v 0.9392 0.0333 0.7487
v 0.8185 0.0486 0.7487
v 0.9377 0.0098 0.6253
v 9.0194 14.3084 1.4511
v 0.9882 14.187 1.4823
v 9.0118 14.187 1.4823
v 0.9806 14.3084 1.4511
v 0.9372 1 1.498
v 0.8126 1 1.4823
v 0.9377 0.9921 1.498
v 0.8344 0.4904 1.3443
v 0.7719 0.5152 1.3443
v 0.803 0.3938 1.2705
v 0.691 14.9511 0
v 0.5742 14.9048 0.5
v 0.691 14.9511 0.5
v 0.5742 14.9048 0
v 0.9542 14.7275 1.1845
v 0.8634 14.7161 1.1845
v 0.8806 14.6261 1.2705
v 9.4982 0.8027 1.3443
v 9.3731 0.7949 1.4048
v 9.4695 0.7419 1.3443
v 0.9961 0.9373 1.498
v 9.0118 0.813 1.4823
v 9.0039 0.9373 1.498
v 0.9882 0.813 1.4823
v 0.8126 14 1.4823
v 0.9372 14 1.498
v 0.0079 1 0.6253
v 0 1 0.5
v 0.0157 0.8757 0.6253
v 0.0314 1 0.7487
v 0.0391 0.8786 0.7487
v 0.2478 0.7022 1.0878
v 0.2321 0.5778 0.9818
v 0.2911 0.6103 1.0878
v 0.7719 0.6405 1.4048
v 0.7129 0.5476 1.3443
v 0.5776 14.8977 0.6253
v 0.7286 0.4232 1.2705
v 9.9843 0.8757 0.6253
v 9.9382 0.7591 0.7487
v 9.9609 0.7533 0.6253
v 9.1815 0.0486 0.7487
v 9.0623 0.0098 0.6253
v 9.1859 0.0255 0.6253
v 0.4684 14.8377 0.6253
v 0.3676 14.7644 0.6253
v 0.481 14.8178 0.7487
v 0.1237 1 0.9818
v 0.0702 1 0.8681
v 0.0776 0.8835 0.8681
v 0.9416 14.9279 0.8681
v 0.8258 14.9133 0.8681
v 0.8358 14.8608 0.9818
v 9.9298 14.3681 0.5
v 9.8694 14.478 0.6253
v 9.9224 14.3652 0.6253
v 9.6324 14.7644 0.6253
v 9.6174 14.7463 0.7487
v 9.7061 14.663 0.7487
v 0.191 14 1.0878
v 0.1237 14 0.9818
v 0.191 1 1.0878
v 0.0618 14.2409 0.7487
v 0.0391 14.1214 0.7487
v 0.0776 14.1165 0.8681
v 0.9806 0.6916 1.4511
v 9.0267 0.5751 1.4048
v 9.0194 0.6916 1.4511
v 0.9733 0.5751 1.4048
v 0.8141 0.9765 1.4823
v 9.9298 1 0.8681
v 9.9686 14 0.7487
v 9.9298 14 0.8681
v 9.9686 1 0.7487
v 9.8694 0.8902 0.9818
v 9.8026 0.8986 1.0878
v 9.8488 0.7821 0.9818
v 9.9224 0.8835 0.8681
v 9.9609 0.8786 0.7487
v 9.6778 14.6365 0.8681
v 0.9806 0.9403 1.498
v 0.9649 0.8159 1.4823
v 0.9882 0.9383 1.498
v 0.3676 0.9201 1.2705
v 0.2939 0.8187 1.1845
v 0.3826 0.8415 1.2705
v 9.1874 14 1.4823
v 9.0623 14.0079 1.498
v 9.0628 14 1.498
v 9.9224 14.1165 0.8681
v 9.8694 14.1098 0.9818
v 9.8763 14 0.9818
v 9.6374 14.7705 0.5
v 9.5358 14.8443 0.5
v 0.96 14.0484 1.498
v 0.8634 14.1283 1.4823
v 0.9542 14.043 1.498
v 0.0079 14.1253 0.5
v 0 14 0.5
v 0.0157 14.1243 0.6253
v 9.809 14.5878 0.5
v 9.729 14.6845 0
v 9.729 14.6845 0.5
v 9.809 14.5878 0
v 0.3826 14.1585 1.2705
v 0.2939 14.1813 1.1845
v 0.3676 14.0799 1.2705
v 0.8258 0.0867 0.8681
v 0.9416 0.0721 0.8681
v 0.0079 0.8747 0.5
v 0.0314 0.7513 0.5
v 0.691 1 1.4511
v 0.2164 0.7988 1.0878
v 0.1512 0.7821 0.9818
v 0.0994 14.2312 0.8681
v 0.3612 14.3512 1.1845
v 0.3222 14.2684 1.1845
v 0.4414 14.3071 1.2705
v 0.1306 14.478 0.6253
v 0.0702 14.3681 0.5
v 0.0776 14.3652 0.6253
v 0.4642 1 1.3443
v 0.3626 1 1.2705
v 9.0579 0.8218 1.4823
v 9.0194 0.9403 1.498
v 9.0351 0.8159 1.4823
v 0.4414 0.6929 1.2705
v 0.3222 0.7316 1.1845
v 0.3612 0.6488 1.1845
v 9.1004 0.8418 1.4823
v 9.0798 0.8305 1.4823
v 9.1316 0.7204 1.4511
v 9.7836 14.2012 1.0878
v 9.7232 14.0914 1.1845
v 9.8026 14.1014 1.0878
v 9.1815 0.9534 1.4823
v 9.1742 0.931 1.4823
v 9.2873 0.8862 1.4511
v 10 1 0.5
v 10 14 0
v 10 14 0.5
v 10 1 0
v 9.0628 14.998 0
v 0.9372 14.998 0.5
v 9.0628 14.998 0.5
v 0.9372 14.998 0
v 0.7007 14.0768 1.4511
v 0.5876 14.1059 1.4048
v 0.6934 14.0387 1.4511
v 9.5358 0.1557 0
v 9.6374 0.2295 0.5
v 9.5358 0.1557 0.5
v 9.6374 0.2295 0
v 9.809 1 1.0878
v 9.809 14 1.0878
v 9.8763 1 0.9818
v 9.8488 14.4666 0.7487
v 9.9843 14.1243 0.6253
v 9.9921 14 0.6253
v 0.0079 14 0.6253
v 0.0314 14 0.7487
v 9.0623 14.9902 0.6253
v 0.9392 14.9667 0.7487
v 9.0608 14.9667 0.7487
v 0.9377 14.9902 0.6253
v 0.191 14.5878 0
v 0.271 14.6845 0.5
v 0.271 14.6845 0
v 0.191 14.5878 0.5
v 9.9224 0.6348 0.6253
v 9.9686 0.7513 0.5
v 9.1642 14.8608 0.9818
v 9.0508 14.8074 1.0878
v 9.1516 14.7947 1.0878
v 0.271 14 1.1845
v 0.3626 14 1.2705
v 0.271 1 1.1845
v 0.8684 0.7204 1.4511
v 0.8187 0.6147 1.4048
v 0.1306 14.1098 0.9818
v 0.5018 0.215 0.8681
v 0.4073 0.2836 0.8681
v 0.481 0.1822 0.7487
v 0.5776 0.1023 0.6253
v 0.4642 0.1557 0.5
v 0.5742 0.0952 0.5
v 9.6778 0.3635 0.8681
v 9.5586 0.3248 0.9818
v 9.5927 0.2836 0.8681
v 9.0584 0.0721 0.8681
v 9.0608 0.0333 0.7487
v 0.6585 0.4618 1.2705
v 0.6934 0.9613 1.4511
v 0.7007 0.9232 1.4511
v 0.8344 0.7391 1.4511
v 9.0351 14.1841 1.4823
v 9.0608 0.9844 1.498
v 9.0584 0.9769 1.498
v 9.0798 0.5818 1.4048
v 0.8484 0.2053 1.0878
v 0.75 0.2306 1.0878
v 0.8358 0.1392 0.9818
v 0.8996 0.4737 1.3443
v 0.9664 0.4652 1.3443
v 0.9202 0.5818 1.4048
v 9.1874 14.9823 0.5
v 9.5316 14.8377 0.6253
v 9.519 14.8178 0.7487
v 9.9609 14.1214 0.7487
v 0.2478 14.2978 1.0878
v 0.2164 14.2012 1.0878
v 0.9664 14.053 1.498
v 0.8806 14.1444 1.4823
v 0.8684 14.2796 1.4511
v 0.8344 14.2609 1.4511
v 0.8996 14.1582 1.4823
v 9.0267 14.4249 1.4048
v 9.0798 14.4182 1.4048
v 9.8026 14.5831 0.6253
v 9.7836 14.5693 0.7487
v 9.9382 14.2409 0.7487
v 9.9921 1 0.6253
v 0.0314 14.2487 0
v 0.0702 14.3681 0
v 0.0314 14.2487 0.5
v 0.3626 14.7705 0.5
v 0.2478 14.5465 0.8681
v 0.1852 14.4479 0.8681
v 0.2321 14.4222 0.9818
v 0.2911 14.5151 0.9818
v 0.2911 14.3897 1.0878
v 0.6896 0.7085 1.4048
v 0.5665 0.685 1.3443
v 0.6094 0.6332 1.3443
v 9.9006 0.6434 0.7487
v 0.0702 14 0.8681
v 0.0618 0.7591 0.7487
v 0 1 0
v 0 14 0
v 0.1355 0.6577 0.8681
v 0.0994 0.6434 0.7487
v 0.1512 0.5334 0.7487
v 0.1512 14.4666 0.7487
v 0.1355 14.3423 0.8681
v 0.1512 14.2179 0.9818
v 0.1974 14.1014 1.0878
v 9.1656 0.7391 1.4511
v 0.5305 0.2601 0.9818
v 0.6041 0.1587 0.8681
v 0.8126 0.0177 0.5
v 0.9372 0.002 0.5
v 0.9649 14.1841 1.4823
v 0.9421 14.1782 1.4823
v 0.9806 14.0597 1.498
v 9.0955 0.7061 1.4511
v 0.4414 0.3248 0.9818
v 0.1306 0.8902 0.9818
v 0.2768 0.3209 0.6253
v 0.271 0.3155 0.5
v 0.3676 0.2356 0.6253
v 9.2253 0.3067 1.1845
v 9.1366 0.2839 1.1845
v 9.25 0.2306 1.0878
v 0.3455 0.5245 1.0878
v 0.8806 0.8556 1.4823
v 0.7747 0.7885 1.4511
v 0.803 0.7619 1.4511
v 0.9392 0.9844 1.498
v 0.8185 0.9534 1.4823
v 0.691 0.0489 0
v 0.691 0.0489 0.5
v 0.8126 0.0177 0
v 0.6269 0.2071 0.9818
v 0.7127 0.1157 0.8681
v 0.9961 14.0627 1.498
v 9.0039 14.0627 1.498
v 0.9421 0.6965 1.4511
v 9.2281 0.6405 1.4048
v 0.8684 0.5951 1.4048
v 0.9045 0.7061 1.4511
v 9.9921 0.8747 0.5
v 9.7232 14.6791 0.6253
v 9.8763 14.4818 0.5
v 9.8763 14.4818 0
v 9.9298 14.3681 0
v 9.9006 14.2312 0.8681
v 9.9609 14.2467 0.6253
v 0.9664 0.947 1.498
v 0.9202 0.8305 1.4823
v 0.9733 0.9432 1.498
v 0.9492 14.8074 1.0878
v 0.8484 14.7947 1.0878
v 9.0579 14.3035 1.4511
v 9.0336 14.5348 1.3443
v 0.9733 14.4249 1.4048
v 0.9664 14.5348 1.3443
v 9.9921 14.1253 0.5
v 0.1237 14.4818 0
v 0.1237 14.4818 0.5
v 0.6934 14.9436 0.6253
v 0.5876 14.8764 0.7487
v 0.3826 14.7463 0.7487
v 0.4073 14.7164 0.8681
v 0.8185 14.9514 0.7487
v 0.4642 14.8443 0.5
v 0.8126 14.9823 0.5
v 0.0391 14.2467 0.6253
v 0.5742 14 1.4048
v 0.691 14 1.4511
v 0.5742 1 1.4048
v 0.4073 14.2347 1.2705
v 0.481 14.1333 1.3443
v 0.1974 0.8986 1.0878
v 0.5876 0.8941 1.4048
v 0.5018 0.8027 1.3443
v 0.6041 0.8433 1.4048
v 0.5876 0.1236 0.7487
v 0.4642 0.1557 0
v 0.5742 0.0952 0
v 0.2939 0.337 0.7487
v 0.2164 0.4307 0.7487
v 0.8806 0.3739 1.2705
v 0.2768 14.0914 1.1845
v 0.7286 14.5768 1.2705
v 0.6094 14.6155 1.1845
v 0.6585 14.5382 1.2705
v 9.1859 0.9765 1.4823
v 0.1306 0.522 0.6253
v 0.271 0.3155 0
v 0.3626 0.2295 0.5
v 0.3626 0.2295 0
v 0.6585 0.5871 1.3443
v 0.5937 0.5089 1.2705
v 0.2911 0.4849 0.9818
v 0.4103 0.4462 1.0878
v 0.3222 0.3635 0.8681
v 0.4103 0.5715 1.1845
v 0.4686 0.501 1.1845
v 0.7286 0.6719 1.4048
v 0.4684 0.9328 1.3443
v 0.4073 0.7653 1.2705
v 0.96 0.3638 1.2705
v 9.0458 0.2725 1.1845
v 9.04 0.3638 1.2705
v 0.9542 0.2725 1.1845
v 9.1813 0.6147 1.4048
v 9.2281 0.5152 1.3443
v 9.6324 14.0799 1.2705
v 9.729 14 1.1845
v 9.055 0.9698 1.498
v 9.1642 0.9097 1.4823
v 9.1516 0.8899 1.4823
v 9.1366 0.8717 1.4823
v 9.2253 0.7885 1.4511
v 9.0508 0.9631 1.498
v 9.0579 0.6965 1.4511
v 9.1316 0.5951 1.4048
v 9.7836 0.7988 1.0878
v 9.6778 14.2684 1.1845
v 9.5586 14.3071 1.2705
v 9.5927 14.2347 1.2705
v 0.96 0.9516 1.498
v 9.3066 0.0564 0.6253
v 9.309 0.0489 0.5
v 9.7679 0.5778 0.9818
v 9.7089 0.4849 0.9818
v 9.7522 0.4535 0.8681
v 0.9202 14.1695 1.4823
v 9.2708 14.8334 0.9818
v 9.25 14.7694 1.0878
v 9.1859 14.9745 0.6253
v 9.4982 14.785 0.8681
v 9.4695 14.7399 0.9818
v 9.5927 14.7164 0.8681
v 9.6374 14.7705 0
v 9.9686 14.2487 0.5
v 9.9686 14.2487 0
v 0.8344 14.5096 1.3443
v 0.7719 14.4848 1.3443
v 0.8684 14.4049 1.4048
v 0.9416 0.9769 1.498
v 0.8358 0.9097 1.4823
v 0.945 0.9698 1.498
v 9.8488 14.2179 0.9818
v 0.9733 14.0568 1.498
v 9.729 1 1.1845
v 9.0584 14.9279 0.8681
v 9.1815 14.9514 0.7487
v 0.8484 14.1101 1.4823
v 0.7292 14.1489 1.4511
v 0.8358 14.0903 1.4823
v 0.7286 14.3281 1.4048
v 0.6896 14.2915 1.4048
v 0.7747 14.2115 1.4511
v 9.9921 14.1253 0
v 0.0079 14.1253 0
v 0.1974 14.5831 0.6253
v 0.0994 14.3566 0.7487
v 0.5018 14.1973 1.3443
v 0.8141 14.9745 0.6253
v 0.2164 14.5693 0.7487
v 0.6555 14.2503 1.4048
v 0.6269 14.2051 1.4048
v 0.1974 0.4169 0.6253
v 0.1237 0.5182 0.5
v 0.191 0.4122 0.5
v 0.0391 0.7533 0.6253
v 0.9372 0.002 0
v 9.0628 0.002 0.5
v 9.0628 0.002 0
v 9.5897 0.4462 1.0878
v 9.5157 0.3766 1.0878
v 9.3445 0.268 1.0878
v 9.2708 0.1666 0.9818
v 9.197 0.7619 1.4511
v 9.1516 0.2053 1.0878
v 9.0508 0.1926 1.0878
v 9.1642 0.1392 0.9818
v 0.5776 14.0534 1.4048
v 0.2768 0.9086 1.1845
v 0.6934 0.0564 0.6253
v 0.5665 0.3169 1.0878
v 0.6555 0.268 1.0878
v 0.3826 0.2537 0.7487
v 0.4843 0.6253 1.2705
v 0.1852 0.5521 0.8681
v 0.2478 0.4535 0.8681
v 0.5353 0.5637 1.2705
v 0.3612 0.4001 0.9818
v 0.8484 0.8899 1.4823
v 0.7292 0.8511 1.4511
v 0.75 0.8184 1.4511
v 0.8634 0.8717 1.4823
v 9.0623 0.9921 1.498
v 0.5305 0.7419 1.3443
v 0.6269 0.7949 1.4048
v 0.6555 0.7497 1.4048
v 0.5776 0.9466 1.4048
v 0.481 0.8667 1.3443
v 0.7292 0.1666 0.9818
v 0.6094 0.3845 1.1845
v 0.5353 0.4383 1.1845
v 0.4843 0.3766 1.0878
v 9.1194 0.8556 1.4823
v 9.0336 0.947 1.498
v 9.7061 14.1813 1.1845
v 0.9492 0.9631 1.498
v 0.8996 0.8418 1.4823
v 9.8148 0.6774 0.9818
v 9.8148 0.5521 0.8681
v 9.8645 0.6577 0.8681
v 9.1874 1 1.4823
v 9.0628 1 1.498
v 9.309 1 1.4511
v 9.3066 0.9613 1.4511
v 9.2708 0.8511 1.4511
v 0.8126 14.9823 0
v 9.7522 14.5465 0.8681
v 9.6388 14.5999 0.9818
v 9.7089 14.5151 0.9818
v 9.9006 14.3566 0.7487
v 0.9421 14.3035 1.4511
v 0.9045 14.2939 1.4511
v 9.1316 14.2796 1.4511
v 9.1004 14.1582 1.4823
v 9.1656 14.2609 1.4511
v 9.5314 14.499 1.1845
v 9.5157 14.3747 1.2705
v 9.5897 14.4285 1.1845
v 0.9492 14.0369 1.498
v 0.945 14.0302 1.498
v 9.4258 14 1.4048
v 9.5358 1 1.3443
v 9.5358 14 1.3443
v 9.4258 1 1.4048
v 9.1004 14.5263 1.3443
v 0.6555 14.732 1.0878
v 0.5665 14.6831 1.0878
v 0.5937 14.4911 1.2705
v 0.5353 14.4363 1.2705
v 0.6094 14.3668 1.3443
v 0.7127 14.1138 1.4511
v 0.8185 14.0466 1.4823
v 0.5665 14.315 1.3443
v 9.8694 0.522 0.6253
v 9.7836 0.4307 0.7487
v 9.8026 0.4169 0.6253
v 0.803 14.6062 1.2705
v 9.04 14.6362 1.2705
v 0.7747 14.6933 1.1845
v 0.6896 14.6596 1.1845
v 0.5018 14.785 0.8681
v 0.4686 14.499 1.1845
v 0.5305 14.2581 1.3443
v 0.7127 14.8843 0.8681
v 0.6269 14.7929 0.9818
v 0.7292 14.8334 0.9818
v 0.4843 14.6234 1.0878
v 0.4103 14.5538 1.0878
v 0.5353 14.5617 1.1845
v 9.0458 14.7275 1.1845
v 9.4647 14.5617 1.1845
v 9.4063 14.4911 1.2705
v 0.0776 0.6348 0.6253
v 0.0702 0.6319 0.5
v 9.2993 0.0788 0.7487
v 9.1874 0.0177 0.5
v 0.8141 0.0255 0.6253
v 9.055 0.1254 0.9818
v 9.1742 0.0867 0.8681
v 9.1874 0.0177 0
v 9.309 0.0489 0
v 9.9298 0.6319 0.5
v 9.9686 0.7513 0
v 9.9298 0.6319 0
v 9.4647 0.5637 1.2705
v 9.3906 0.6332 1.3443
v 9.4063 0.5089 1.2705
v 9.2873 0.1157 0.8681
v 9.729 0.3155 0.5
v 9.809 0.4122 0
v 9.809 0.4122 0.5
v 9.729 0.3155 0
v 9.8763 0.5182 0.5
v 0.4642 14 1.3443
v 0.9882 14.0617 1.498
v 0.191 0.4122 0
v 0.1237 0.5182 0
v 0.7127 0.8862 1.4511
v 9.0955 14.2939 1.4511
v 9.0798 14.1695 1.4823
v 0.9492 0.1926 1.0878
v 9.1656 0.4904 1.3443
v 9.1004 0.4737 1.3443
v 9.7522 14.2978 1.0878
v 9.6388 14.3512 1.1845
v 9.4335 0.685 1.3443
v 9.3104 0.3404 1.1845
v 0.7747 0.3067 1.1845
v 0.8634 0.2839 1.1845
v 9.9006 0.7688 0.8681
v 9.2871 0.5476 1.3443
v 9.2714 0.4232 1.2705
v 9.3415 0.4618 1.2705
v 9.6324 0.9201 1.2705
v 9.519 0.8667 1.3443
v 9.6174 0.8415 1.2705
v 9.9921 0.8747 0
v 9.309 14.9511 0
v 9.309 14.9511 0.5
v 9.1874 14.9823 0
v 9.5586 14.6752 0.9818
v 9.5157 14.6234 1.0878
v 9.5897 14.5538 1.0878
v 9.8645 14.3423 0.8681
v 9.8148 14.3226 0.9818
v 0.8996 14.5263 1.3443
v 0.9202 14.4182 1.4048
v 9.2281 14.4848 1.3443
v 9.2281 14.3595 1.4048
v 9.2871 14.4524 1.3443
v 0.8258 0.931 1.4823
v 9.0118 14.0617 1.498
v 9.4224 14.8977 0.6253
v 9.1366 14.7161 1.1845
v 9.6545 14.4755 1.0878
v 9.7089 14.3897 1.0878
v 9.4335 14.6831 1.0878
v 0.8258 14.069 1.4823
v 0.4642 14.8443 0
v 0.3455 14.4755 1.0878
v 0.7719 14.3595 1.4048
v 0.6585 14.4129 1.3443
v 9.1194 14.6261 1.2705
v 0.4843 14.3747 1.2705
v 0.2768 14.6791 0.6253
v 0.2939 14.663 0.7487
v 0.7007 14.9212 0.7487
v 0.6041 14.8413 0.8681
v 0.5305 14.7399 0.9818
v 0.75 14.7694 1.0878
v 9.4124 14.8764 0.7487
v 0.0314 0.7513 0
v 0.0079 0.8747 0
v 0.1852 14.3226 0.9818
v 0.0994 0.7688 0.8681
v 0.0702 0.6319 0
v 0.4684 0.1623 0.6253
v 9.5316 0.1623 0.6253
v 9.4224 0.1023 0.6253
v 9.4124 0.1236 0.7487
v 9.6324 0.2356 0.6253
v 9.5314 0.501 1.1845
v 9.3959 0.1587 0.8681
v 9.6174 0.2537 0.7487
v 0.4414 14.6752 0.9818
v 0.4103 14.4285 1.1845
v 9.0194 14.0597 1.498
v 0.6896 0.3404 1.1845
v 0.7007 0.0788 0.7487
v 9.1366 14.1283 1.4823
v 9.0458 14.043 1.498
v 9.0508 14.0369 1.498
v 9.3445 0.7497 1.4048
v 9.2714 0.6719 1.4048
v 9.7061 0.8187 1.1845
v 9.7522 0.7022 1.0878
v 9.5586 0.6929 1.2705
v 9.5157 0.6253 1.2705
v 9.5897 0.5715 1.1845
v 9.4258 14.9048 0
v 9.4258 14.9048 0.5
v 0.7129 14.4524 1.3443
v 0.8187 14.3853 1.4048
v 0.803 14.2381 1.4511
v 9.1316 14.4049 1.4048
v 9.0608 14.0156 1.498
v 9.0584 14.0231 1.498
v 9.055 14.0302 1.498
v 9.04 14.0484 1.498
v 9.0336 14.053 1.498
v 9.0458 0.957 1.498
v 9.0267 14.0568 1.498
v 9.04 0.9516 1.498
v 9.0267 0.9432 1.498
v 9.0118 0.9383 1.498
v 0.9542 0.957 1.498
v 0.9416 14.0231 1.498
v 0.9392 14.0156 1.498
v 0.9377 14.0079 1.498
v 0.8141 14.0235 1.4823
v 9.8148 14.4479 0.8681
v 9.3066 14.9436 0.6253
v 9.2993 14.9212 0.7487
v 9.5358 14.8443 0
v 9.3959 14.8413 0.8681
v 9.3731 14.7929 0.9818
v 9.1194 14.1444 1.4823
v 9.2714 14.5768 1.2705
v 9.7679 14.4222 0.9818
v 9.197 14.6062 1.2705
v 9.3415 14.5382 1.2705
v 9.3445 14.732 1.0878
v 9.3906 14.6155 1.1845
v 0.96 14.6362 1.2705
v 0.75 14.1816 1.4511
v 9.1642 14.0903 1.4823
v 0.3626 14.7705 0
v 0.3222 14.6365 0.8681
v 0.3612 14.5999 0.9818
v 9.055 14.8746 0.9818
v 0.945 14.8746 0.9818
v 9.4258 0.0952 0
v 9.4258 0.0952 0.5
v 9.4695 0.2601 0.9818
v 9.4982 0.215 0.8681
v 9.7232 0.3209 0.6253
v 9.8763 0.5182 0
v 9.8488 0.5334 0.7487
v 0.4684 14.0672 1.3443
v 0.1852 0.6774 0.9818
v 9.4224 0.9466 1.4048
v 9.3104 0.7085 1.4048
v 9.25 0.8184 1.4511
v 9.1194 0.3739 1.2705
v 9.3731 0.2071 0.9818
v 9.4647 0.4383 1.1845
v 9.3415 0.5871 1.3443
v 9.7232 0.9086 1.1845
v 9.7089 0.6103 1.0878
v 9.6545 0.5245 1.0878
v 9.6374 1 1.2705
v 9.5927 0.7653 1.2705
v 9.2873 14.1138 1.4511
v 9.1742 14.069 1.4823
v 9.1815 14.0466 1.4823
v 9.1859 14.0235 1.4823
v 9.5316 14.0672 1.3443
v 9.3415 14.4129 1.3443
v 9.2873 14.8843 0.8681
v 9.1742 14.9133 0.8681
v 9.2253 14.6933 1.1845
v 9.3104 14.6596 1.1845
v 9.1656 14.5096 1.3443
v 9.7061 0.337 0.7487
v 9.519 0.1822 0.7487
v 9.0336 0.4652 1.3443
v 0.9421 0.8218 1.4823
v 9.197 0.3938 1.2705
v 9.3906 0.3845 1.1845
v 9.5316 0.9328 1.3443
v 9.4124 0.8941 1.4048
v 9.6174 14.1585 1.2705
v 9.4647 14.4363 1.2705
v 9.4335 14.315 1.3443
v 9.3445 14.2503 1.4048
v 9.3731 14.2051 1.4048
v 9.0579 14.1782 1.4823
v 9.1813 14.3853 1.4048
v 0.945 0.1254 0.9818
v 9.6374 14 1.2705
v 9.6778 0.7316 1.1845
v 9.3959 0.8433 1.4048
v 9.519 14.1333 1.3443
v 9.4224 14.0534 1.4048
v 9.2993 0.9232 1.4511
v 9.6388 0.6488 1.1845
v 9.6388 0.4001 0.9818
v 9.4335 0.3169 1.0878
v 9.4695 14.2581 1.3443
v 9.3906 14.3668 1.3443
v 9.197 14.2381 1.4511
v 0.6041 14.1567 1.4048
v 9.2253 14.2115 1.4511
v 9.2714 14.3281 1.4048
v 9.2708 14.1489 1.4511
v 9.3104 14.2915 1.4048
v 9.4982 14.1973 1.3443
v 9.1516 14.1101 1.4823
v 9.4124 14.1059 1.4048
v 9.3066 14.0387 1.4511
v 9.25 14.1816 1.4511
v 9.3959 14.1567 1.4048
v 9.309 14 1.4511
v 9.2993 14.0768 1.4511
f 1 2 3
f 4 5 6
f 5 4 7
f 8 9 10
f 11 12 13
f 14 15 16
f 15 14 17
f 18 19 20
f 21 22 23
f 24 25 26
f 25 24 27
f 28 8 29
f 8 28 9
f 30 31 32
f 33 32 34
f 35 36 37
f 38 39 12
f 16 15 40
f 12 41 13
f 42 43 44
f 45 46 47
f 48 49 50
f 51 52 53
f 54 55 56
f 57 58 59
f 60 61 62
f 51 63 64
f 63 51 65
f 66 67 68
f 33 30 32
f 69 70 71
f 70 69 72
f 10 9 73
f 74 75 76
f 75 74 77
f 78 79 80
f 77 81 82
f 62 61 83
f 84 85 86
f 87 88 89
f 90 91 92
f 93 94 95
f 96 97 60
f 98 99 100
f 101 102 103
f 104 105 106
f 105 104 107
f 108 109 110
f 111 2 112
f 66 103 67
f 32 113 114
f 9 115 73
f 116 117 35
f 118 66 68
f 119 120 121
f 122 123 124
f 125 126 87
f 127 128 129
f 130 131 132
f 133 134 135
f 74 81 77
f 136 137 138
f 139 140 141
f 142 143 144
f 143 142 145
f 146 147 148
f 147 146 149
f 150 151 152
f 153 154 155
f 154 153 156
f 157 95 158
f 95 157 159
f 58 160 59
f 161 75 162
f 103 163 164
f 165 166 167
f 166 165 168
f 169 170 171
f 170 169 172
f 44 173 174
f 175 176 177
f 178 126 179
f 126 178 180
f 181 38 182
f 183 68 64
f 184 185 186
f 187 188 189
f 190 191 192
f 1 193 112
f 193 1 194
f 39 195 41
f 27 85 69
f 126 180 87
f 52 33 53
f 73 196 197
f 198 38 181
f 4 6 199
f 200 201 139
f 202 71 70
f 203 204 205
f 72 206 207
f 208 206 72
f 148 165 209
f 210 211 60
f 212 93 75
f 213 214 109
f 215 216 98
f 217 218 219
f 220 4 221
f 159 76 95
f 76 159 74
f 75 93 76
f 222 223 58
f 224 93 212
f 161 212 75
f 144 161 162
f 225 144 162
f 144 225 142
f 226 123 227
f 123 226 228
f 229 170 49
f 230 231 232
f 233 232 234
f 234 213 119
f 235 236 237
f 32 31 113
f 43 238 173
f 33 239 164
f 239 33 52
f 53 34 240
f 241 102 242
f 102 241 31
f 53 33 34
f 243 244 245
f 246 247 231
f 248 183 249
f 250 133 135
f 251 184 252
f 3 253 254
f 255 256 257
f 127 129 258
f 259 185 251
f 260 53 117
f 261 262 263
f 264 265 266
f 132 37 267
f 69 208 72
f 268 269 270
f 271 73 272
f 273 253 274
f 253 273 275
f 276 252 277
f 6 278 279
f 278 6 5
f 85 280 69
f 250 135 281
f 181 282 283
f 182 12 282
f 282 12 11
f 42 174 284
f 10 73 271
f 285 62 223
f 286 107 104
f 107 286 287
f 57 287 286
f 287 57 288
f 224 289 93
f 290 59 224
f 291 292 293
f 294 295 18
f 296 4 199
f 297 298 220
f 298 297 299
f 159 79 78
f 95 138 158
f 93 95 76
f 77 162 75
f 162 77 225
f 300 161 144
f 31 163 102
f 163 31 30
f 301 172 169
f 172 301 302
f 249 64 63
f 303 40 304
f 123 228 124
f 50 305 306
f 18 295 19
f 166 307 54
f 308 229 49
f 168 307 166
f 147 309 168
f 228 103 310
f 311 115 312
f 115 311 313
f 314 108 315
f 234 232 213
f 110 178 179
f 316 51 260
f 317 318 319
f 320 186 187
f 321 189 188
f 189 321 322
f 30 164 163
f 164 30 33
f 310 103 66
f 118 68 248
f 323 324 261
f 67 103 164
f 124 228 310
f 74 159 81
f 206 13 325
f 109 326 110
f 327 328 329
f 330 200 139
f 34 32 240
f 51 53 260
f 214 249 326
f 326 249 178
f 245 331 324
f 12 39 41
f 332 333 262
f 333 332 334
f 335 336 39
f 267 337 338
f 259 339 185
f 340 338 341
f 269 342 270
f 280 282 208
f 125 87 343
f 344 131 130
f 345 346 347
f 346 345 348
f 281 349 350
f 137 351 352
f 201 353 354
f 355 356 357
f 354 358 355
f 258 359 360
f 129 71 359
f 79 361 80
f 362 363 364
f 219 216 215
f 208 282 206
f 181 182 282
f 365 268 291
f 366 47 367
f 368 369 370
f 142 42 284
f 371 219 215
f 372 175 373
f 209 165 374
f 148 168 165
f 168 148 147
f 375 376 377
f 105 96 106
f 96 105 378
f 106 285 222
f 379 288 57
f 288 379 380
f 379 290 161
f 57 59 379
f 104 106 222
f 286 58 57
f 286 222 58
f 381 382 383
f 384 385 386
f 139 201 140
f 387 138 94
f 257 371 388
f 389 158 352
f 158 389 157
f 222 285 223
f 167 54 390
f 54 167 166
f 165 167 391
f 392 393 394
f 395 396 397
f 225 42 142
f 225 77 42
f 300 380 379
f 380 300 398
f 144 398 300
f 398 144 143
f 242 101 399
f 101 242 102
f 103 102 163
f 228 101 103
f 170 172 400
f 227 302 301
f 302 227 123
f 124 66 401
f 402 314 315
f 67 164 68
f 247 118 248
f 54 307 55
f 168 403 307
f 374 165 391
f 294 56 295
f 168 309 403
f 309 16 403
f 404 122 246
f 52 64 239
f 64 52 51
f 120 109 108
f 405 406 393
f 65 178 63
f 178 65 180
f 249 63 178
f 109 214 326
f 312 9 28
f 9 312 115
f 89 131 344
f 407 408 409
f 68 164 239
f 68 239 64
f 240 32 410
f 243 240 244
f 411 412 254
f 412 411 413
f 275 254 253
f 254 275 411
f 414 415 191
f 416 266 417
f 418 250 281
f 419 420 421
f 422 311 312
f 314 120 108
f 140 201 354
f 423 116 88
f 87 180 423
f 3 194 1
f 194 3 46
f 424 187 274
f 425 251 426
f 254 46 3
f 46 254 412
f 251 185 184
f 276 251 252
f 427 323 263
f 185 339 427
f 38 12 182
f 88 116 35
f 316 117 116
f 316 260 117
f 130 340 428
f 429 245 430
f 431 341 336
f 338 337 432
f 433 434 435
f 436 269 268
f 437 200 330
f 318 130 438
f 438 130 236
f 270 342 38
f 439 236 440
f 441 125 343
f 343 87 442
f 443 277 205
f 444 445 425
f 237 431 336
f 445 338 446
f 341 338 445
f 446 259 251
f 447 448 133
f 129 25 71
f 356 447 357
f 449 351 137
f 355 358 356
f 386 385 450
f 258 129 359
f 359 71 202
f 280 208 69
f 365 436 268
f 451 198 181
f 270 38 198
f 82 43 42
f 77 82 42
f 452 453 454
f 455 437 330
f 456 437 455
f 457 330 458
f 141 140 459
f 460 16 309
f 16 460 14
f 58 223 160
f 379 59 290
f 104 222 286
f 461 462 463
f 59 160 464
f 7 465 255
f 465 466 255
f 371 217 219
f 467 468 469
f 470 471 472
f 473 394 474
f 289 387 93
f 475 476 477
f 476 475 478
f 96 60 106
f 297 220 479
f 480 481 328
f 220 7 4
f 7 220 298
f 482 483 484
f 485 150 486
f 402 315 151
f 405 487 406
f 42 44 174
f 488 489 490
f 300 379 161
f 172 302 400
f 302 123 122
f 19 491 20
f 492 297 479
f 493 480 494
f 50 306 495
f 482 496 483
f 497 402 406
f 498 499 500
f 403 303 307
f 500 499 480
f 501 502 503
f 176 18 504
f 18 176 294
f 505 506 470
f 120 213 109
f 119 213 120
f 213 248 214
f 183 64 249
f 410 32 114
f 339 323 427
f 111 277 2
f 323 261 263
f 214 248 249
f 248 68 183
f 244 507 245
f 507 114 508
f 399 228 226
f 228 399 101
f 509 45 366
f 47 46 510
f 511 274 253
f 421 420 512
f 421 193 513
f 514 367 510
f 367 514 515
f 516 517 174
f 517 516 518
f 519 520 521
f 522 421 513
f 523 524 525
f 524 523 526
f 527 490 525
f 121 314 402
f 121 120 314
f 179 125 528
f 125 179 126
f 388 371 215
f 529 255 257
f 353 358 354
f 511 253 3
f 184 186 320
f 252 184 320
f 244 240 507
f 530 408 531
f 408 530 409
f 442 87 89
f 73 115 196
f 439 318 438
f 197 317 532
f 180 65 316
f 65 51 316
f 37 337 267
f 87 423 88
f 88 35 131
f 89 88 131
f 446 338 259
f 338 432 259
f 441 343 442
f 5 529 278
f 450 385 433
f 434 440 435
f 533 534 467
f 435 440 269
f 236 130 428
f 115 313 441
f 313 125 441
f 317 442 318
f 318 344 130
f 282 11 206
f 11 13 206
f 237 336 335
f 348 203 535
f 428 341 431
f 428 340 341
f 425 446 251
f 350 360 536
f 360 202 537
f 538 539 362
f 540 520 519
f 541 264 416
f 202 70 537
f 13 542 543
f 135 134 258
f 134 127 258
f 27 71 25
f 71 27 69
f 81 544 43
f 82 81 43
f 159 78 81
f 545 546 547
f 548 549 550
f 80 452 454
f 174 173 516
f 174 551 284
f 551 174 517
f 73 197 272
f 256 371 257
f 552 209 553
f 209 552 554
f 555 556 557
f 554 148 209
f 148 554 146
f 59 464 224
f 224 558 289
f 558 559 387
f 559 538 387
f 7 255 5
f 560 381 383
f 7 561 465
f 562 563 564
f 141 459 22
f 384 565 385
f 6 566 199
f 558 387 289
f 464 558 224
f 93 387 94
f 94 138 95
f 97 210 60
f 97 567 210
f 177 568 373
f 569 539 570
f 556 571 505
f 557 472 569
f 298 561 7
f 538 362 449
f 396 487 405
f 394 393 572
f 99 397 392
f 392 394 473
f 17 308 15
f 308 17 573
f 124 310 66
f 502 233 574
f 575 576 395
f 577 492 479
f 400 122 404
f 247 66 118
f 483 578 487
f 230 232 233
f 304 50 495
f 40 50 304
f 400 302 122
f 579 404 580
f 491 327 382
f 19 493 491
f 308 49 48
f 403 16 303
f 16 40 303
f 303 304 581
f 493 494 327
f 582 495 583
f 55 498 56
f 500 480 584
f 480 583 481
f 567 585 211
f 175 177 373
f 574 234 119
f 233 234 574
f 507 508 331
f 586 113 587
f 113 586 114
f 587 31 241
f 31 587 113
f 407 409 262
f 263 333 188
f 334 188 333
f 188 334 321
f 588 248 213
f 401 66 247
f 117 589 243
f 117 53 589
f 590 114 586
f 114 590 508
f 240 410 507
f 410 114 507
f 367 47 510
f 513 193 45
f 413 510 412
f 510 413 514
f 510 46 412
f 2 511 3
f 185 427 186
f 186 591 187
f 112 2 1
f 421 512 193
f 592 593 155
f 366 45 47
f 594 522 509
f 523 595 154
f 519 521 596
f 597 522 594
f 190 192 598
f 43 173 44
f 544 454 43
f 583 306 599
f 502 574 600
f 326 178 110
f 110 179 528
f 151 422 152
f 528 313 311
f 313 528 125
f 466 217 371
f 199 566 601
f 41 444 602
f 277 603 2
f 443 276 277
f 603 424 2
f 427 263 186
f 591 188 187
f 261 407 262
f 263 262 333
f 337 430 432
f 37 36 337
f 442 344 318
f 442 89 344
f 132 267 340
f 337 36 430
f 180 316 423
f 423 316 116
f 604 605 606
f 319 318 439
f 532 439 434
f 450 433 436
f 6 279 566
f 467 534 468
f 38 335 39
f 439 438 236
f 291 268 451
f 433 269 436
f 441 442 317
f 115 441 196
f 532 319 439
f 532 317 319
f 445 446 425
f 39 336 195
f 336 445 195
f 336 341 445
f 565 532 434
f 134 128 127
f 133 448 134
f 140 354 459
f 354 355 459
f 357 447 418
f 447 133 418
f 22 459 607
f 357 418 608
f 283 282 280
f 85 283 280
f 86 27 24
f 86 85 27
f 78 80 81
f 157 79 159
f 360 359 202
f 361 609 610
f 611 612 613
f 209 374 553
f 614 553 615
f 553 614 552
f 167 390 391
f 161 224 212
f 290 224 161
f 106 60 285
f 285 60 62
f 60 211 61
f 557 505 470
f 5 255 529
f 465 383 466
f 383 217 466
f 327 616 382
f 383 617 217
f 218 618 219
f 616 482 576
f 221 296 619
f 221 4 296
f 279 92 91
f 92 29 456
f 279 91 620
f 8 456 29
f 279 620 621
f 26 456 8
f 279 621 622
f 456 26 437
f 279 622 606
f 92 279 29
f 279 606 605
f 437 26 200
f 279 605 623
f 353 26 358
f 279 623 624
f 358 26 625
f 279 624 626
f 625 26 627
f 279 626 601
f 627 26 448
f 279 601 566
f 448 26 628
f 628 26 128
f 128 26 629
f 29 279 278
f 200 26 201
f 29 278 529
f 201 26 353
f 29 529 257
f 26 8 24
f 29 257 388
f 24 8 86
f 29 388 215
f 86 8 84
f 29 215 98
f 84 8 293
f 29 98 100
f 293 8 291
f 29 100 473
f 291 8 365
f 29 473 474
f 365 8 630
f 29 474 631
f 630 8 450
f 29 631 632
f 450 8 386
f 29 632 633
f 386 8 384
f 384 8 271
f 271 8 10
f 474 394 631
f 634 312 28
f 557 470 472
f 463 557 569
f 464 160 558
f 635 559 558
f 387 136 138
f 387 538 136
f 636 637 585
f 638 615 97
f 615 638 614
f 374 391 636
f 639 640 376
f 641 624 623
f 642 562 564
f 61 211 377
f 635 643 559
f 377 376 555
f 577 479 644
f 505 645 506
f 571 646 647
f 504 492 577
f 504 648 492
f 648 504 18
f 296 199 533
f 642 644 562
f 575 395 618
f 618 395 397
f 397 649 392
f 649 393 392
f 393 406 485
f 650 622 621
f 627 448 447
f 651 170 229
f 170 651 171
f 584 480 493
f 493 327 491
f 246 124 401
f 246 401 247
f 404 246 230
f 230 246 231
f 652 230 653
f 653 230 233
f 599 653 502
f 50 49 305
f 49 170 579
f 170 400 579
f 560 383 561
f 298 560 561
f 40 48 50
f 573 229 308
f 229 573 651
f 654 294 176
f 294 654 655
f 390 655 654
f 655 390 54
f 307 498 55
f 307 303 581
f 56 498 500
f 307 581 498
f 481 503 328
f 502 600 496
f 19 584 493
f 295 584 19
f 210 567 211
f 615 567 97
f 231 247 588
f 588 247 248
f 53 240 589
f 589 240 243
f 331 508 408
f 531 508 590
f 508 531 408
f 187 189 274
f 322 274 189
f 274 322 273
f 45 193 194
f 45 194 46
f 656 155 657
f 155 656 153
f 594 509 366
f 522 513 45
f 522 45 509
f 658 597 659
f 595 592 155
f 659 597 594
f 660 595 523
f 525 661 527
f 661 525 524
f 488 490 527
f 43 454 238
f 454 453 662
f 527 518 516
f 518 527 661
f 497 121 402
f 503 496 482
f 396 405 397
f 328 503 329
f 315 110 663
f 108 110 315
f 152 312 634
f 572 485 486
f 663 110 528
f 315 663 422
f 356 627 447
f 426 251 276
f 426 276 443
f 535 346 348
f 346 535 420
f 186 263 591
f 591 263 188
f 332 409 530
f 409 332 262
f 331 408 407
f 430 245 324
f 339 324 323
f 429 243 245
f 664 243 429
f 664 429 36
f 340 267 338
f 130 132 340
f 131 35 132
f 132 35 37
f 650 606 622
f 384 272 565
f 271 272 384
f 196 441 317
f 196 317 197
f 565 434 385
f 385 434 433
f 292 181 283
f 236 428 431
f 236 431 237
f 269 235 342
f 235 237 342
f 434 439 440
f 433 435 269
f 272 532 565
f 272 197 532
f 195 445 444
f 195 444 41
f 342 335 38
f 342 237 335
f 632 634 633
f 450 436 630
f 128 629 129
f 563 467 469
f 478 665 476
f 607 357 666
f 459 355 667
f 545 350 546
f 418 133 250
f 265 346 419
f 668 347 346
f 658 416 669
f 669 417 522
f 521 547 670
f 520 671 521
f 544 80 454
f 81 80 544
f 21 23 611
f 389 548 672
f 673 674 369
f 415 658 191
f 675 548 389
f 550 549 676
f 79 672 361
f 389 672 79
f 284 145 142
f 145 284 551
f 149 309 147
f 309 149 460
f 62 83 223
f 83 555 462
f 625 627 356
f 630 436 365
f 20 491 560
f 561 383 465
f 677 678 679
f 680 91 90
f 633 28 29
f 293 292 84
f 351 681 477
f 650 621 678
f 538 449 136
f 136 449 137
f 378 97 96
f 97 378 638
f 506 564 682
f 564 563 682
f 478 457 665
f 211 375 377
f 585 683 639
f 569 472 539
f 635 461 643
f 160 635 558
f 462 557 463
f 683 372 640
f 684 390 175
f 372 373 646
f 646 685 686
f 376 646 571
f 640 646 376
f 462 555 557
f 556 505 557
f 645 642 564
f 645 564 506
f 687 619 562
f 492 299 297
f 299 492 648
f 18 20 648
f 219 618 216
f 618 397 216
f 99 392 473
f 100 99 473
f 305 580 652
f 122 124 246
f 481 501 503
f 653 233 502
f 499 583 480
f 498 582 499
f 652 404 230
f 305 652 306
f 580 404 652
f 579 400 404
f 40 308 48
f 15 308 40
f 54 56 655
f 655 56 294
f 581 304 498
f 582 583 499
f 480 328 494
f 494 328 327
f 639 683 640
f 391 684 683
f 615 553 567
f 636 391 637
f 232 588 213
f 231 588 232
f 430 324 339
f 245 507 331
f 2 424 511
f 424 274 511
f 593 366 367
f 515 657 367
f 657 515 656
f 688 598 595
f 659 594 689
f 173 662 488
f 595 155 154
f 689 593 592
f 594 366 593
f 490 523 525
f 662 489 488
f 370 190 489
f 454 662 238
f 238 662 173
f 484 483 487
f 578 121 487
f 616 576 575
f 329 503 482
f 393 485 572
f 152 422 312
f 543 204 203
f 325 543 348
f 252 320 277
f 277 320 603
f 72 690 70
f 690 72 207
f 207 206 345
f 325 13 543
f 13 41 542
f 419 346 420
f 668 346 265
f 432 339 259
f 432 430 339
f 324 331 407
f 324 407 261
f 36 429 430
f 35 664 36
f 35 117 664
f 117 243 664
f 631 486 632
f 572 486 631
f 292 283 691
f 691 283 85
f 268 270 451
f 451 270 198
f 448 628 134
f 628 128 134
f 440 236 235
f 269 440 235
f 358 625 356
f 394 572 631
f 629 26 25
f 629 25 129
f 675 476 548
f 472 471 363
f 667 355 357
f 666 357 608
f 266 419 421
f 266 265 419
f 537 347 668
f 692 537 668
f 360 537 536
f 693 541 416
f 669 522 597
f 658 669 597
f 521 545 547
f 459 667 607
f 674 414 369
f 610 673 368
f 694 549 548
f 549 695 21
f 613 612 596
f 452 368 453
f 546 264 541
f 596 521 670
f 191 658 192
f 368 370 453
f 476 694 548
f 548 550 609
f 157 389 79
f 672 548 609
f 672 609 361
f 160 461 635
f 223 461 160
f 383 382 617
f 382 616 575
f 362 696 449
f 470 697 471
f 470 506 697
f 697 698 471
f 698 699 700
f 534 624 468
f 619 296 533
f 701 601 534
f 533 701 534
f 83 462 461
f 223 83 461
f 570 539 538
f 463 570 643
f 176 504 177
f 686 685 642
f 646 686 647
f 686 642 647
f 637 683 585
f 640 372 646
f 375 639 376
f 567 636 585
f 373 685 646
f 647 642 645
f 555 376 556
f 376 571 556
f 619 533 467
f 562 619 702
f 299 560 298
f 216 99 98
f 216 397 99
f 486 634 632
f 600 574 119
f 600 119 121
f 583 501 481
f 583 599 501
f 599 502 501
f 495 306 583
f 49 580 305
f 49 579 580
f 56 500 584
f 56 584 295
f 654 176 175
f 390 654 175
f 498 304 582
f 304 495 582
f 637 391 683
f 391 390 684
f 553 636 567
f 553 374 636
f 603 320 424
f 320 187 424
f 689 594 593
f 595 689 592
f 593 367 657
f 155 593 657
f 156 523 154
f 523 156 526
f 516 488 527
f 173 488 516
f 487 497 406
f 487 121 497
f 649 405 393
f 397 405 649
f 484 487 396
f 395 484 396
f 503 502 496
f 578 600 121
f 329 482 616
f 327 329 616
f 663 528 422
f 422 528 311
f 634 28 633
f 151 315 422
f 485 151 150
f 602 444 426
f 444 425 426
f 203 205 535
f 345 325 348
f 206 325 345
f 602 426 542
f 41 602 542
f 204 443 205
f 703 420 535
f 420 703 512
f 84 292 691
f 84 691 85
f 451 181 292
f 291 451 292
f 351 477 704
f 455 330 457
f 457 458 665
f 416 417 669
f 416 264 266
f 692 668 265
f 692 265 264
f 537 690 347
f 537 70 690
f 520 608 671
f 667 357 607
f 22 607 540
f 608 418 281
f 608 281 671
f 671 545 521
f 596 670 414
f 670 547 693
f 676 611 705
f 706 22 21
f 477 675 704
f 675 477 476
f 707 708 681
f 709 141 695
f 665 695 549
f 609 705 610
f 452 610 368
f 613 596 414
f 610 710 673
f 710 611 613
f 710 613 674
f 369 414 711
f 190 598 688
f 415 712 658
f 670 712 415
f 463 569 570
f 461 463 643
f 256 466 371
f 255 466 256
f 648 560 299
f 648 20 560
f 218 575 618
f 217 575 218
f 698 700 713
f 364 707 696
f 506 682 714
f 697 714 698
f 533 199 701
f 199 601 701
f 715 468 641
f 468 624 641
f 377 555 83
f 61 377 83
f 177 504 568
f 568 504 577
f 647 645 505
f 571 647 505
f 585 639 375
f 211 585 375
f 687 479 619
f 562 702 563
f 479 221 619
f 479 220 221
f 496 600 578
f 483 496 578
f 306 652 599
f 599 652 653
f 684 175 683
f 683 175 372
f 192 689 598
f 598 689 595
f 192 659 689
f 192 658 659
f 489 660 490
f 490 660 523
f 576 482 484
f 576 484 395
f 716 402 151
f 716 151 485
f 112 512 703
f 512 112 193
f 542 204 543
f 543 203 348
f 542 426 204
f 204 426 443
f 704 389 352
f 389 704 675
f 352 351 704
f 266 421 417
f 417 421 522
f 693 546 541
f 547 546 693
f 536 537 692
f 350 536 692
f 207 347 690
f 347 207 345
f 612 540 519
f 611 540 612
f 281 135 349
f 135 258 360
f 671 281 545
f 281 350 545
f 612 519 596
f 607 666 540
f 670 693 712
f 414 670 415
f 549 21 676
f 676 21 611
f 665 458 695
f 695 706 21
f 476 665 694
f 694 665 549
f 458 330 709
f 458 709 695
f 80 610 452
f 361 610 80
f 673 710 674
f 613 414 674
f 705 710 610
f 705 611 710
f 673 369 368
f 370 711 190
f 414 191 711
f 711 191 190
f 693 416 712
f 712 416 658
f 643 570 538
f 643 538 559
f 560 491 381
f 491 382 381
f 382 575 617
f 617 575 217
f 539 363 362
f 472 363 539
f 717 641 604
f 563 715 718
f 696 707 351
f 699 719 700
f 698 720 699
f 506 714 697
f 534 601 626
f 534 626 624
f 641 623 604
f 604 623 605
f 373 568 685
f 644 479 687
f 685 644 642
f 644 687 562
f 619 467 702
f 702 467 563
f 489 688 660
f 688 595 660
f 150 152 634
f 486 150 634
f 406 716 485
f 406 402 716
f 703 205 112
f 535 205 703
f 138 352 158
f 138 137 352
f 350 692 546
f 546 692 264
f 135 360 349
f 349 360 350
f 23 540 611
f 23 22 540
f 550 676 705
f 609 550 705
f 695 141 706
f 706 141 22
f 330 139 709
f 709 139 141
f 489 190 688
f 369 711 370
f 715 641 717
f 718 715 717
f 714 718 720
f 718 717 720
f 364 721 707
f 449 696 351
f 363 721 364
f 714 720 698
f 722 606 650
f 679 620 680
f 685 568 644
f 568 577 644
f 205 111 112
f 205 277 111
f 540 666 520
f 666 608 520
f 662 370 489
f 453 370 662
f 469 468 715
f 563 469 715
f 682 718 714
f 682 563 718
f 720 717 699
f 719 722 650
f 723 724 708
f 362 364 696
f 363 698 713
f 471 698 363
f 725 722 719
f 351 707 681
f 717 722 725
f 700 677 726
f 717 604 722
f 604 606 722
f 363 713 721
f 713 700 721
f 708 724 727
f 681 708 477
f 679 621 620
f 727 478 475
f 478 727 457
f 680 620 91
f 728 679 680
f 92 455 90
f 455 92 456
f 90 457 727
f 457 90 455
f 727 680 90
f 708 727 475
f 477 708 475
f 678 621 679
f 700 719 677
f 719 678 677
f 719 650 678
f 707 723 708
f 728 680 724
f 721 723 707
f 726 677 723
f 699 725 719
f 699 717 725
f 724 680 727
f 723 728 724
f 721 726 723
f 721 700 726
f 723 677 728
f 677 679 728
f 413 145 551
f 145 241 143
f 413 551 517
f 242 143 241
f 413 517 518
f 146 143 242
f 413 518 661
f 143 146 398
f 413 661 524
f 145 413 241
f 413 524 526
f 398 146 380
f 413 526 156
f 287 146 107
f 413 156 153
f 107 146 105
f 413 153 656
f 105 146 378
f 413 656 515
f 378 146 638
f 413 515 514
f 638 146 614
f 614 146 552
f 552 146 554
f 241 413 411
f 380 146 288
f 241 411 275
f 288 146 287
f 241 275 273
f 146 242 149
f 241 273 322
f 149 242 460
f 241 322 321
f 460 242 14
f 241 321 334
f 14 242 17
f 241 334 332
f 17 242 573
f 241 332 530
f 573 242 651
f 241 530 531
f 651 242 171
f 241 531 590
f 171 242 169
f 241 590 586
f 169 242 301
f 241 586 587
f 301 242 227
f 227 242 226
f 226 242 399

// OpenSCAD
// file: rounded_cube.scad
// Provides a cube with rounded edges. You can also ask for some sides of it to
// not be rounded
//
// The origin of the object is in what would be the smallest [x,y,z] corner on
// a non-rounded cube
module RoundedCube(size, r, rounded_bottom=true) {
    for(i = [0:2])
        assert(
            size[i] + extra_size[i] > 2 * r,
            str("Cube dimension must be bigger than twice the rounding ",
                "radius"));
    extra_size = [0, 0, rounded_bottom ? 0 : r];
    extra_translate = [0, 0, rounded_bottom ? 0 : -r];
    difference() {
        translate([r,r,r] + extra_translate) {
            minkowski() {
                cube(size + extra_size - 2*[r,r,r]);
                sphere(r=r);
            }
        }
        if (!rounded_bottom) {
            translate([-1, -1, -2 * r - 1])
                cube([size[0] + 2, size[1] + 2, 2 * r + 1]);

        }
    }
}
// main file
use <rounded_cube.scad>

$fn=50;
// RoundedCube(size=[10,15,20], r=1); // testdata/rounded_cube/cube.stl
// RoundedCube(size=[10,15,20], r=1, rounded_bottom=false); // testdata/rounded_cube/flat_bottom.stl
RoundedCube(size=[10,15,1.5], r=1, rounded_bottom=false); // testdata/rounded_cube/big_round_with_flat_bottom.stl
